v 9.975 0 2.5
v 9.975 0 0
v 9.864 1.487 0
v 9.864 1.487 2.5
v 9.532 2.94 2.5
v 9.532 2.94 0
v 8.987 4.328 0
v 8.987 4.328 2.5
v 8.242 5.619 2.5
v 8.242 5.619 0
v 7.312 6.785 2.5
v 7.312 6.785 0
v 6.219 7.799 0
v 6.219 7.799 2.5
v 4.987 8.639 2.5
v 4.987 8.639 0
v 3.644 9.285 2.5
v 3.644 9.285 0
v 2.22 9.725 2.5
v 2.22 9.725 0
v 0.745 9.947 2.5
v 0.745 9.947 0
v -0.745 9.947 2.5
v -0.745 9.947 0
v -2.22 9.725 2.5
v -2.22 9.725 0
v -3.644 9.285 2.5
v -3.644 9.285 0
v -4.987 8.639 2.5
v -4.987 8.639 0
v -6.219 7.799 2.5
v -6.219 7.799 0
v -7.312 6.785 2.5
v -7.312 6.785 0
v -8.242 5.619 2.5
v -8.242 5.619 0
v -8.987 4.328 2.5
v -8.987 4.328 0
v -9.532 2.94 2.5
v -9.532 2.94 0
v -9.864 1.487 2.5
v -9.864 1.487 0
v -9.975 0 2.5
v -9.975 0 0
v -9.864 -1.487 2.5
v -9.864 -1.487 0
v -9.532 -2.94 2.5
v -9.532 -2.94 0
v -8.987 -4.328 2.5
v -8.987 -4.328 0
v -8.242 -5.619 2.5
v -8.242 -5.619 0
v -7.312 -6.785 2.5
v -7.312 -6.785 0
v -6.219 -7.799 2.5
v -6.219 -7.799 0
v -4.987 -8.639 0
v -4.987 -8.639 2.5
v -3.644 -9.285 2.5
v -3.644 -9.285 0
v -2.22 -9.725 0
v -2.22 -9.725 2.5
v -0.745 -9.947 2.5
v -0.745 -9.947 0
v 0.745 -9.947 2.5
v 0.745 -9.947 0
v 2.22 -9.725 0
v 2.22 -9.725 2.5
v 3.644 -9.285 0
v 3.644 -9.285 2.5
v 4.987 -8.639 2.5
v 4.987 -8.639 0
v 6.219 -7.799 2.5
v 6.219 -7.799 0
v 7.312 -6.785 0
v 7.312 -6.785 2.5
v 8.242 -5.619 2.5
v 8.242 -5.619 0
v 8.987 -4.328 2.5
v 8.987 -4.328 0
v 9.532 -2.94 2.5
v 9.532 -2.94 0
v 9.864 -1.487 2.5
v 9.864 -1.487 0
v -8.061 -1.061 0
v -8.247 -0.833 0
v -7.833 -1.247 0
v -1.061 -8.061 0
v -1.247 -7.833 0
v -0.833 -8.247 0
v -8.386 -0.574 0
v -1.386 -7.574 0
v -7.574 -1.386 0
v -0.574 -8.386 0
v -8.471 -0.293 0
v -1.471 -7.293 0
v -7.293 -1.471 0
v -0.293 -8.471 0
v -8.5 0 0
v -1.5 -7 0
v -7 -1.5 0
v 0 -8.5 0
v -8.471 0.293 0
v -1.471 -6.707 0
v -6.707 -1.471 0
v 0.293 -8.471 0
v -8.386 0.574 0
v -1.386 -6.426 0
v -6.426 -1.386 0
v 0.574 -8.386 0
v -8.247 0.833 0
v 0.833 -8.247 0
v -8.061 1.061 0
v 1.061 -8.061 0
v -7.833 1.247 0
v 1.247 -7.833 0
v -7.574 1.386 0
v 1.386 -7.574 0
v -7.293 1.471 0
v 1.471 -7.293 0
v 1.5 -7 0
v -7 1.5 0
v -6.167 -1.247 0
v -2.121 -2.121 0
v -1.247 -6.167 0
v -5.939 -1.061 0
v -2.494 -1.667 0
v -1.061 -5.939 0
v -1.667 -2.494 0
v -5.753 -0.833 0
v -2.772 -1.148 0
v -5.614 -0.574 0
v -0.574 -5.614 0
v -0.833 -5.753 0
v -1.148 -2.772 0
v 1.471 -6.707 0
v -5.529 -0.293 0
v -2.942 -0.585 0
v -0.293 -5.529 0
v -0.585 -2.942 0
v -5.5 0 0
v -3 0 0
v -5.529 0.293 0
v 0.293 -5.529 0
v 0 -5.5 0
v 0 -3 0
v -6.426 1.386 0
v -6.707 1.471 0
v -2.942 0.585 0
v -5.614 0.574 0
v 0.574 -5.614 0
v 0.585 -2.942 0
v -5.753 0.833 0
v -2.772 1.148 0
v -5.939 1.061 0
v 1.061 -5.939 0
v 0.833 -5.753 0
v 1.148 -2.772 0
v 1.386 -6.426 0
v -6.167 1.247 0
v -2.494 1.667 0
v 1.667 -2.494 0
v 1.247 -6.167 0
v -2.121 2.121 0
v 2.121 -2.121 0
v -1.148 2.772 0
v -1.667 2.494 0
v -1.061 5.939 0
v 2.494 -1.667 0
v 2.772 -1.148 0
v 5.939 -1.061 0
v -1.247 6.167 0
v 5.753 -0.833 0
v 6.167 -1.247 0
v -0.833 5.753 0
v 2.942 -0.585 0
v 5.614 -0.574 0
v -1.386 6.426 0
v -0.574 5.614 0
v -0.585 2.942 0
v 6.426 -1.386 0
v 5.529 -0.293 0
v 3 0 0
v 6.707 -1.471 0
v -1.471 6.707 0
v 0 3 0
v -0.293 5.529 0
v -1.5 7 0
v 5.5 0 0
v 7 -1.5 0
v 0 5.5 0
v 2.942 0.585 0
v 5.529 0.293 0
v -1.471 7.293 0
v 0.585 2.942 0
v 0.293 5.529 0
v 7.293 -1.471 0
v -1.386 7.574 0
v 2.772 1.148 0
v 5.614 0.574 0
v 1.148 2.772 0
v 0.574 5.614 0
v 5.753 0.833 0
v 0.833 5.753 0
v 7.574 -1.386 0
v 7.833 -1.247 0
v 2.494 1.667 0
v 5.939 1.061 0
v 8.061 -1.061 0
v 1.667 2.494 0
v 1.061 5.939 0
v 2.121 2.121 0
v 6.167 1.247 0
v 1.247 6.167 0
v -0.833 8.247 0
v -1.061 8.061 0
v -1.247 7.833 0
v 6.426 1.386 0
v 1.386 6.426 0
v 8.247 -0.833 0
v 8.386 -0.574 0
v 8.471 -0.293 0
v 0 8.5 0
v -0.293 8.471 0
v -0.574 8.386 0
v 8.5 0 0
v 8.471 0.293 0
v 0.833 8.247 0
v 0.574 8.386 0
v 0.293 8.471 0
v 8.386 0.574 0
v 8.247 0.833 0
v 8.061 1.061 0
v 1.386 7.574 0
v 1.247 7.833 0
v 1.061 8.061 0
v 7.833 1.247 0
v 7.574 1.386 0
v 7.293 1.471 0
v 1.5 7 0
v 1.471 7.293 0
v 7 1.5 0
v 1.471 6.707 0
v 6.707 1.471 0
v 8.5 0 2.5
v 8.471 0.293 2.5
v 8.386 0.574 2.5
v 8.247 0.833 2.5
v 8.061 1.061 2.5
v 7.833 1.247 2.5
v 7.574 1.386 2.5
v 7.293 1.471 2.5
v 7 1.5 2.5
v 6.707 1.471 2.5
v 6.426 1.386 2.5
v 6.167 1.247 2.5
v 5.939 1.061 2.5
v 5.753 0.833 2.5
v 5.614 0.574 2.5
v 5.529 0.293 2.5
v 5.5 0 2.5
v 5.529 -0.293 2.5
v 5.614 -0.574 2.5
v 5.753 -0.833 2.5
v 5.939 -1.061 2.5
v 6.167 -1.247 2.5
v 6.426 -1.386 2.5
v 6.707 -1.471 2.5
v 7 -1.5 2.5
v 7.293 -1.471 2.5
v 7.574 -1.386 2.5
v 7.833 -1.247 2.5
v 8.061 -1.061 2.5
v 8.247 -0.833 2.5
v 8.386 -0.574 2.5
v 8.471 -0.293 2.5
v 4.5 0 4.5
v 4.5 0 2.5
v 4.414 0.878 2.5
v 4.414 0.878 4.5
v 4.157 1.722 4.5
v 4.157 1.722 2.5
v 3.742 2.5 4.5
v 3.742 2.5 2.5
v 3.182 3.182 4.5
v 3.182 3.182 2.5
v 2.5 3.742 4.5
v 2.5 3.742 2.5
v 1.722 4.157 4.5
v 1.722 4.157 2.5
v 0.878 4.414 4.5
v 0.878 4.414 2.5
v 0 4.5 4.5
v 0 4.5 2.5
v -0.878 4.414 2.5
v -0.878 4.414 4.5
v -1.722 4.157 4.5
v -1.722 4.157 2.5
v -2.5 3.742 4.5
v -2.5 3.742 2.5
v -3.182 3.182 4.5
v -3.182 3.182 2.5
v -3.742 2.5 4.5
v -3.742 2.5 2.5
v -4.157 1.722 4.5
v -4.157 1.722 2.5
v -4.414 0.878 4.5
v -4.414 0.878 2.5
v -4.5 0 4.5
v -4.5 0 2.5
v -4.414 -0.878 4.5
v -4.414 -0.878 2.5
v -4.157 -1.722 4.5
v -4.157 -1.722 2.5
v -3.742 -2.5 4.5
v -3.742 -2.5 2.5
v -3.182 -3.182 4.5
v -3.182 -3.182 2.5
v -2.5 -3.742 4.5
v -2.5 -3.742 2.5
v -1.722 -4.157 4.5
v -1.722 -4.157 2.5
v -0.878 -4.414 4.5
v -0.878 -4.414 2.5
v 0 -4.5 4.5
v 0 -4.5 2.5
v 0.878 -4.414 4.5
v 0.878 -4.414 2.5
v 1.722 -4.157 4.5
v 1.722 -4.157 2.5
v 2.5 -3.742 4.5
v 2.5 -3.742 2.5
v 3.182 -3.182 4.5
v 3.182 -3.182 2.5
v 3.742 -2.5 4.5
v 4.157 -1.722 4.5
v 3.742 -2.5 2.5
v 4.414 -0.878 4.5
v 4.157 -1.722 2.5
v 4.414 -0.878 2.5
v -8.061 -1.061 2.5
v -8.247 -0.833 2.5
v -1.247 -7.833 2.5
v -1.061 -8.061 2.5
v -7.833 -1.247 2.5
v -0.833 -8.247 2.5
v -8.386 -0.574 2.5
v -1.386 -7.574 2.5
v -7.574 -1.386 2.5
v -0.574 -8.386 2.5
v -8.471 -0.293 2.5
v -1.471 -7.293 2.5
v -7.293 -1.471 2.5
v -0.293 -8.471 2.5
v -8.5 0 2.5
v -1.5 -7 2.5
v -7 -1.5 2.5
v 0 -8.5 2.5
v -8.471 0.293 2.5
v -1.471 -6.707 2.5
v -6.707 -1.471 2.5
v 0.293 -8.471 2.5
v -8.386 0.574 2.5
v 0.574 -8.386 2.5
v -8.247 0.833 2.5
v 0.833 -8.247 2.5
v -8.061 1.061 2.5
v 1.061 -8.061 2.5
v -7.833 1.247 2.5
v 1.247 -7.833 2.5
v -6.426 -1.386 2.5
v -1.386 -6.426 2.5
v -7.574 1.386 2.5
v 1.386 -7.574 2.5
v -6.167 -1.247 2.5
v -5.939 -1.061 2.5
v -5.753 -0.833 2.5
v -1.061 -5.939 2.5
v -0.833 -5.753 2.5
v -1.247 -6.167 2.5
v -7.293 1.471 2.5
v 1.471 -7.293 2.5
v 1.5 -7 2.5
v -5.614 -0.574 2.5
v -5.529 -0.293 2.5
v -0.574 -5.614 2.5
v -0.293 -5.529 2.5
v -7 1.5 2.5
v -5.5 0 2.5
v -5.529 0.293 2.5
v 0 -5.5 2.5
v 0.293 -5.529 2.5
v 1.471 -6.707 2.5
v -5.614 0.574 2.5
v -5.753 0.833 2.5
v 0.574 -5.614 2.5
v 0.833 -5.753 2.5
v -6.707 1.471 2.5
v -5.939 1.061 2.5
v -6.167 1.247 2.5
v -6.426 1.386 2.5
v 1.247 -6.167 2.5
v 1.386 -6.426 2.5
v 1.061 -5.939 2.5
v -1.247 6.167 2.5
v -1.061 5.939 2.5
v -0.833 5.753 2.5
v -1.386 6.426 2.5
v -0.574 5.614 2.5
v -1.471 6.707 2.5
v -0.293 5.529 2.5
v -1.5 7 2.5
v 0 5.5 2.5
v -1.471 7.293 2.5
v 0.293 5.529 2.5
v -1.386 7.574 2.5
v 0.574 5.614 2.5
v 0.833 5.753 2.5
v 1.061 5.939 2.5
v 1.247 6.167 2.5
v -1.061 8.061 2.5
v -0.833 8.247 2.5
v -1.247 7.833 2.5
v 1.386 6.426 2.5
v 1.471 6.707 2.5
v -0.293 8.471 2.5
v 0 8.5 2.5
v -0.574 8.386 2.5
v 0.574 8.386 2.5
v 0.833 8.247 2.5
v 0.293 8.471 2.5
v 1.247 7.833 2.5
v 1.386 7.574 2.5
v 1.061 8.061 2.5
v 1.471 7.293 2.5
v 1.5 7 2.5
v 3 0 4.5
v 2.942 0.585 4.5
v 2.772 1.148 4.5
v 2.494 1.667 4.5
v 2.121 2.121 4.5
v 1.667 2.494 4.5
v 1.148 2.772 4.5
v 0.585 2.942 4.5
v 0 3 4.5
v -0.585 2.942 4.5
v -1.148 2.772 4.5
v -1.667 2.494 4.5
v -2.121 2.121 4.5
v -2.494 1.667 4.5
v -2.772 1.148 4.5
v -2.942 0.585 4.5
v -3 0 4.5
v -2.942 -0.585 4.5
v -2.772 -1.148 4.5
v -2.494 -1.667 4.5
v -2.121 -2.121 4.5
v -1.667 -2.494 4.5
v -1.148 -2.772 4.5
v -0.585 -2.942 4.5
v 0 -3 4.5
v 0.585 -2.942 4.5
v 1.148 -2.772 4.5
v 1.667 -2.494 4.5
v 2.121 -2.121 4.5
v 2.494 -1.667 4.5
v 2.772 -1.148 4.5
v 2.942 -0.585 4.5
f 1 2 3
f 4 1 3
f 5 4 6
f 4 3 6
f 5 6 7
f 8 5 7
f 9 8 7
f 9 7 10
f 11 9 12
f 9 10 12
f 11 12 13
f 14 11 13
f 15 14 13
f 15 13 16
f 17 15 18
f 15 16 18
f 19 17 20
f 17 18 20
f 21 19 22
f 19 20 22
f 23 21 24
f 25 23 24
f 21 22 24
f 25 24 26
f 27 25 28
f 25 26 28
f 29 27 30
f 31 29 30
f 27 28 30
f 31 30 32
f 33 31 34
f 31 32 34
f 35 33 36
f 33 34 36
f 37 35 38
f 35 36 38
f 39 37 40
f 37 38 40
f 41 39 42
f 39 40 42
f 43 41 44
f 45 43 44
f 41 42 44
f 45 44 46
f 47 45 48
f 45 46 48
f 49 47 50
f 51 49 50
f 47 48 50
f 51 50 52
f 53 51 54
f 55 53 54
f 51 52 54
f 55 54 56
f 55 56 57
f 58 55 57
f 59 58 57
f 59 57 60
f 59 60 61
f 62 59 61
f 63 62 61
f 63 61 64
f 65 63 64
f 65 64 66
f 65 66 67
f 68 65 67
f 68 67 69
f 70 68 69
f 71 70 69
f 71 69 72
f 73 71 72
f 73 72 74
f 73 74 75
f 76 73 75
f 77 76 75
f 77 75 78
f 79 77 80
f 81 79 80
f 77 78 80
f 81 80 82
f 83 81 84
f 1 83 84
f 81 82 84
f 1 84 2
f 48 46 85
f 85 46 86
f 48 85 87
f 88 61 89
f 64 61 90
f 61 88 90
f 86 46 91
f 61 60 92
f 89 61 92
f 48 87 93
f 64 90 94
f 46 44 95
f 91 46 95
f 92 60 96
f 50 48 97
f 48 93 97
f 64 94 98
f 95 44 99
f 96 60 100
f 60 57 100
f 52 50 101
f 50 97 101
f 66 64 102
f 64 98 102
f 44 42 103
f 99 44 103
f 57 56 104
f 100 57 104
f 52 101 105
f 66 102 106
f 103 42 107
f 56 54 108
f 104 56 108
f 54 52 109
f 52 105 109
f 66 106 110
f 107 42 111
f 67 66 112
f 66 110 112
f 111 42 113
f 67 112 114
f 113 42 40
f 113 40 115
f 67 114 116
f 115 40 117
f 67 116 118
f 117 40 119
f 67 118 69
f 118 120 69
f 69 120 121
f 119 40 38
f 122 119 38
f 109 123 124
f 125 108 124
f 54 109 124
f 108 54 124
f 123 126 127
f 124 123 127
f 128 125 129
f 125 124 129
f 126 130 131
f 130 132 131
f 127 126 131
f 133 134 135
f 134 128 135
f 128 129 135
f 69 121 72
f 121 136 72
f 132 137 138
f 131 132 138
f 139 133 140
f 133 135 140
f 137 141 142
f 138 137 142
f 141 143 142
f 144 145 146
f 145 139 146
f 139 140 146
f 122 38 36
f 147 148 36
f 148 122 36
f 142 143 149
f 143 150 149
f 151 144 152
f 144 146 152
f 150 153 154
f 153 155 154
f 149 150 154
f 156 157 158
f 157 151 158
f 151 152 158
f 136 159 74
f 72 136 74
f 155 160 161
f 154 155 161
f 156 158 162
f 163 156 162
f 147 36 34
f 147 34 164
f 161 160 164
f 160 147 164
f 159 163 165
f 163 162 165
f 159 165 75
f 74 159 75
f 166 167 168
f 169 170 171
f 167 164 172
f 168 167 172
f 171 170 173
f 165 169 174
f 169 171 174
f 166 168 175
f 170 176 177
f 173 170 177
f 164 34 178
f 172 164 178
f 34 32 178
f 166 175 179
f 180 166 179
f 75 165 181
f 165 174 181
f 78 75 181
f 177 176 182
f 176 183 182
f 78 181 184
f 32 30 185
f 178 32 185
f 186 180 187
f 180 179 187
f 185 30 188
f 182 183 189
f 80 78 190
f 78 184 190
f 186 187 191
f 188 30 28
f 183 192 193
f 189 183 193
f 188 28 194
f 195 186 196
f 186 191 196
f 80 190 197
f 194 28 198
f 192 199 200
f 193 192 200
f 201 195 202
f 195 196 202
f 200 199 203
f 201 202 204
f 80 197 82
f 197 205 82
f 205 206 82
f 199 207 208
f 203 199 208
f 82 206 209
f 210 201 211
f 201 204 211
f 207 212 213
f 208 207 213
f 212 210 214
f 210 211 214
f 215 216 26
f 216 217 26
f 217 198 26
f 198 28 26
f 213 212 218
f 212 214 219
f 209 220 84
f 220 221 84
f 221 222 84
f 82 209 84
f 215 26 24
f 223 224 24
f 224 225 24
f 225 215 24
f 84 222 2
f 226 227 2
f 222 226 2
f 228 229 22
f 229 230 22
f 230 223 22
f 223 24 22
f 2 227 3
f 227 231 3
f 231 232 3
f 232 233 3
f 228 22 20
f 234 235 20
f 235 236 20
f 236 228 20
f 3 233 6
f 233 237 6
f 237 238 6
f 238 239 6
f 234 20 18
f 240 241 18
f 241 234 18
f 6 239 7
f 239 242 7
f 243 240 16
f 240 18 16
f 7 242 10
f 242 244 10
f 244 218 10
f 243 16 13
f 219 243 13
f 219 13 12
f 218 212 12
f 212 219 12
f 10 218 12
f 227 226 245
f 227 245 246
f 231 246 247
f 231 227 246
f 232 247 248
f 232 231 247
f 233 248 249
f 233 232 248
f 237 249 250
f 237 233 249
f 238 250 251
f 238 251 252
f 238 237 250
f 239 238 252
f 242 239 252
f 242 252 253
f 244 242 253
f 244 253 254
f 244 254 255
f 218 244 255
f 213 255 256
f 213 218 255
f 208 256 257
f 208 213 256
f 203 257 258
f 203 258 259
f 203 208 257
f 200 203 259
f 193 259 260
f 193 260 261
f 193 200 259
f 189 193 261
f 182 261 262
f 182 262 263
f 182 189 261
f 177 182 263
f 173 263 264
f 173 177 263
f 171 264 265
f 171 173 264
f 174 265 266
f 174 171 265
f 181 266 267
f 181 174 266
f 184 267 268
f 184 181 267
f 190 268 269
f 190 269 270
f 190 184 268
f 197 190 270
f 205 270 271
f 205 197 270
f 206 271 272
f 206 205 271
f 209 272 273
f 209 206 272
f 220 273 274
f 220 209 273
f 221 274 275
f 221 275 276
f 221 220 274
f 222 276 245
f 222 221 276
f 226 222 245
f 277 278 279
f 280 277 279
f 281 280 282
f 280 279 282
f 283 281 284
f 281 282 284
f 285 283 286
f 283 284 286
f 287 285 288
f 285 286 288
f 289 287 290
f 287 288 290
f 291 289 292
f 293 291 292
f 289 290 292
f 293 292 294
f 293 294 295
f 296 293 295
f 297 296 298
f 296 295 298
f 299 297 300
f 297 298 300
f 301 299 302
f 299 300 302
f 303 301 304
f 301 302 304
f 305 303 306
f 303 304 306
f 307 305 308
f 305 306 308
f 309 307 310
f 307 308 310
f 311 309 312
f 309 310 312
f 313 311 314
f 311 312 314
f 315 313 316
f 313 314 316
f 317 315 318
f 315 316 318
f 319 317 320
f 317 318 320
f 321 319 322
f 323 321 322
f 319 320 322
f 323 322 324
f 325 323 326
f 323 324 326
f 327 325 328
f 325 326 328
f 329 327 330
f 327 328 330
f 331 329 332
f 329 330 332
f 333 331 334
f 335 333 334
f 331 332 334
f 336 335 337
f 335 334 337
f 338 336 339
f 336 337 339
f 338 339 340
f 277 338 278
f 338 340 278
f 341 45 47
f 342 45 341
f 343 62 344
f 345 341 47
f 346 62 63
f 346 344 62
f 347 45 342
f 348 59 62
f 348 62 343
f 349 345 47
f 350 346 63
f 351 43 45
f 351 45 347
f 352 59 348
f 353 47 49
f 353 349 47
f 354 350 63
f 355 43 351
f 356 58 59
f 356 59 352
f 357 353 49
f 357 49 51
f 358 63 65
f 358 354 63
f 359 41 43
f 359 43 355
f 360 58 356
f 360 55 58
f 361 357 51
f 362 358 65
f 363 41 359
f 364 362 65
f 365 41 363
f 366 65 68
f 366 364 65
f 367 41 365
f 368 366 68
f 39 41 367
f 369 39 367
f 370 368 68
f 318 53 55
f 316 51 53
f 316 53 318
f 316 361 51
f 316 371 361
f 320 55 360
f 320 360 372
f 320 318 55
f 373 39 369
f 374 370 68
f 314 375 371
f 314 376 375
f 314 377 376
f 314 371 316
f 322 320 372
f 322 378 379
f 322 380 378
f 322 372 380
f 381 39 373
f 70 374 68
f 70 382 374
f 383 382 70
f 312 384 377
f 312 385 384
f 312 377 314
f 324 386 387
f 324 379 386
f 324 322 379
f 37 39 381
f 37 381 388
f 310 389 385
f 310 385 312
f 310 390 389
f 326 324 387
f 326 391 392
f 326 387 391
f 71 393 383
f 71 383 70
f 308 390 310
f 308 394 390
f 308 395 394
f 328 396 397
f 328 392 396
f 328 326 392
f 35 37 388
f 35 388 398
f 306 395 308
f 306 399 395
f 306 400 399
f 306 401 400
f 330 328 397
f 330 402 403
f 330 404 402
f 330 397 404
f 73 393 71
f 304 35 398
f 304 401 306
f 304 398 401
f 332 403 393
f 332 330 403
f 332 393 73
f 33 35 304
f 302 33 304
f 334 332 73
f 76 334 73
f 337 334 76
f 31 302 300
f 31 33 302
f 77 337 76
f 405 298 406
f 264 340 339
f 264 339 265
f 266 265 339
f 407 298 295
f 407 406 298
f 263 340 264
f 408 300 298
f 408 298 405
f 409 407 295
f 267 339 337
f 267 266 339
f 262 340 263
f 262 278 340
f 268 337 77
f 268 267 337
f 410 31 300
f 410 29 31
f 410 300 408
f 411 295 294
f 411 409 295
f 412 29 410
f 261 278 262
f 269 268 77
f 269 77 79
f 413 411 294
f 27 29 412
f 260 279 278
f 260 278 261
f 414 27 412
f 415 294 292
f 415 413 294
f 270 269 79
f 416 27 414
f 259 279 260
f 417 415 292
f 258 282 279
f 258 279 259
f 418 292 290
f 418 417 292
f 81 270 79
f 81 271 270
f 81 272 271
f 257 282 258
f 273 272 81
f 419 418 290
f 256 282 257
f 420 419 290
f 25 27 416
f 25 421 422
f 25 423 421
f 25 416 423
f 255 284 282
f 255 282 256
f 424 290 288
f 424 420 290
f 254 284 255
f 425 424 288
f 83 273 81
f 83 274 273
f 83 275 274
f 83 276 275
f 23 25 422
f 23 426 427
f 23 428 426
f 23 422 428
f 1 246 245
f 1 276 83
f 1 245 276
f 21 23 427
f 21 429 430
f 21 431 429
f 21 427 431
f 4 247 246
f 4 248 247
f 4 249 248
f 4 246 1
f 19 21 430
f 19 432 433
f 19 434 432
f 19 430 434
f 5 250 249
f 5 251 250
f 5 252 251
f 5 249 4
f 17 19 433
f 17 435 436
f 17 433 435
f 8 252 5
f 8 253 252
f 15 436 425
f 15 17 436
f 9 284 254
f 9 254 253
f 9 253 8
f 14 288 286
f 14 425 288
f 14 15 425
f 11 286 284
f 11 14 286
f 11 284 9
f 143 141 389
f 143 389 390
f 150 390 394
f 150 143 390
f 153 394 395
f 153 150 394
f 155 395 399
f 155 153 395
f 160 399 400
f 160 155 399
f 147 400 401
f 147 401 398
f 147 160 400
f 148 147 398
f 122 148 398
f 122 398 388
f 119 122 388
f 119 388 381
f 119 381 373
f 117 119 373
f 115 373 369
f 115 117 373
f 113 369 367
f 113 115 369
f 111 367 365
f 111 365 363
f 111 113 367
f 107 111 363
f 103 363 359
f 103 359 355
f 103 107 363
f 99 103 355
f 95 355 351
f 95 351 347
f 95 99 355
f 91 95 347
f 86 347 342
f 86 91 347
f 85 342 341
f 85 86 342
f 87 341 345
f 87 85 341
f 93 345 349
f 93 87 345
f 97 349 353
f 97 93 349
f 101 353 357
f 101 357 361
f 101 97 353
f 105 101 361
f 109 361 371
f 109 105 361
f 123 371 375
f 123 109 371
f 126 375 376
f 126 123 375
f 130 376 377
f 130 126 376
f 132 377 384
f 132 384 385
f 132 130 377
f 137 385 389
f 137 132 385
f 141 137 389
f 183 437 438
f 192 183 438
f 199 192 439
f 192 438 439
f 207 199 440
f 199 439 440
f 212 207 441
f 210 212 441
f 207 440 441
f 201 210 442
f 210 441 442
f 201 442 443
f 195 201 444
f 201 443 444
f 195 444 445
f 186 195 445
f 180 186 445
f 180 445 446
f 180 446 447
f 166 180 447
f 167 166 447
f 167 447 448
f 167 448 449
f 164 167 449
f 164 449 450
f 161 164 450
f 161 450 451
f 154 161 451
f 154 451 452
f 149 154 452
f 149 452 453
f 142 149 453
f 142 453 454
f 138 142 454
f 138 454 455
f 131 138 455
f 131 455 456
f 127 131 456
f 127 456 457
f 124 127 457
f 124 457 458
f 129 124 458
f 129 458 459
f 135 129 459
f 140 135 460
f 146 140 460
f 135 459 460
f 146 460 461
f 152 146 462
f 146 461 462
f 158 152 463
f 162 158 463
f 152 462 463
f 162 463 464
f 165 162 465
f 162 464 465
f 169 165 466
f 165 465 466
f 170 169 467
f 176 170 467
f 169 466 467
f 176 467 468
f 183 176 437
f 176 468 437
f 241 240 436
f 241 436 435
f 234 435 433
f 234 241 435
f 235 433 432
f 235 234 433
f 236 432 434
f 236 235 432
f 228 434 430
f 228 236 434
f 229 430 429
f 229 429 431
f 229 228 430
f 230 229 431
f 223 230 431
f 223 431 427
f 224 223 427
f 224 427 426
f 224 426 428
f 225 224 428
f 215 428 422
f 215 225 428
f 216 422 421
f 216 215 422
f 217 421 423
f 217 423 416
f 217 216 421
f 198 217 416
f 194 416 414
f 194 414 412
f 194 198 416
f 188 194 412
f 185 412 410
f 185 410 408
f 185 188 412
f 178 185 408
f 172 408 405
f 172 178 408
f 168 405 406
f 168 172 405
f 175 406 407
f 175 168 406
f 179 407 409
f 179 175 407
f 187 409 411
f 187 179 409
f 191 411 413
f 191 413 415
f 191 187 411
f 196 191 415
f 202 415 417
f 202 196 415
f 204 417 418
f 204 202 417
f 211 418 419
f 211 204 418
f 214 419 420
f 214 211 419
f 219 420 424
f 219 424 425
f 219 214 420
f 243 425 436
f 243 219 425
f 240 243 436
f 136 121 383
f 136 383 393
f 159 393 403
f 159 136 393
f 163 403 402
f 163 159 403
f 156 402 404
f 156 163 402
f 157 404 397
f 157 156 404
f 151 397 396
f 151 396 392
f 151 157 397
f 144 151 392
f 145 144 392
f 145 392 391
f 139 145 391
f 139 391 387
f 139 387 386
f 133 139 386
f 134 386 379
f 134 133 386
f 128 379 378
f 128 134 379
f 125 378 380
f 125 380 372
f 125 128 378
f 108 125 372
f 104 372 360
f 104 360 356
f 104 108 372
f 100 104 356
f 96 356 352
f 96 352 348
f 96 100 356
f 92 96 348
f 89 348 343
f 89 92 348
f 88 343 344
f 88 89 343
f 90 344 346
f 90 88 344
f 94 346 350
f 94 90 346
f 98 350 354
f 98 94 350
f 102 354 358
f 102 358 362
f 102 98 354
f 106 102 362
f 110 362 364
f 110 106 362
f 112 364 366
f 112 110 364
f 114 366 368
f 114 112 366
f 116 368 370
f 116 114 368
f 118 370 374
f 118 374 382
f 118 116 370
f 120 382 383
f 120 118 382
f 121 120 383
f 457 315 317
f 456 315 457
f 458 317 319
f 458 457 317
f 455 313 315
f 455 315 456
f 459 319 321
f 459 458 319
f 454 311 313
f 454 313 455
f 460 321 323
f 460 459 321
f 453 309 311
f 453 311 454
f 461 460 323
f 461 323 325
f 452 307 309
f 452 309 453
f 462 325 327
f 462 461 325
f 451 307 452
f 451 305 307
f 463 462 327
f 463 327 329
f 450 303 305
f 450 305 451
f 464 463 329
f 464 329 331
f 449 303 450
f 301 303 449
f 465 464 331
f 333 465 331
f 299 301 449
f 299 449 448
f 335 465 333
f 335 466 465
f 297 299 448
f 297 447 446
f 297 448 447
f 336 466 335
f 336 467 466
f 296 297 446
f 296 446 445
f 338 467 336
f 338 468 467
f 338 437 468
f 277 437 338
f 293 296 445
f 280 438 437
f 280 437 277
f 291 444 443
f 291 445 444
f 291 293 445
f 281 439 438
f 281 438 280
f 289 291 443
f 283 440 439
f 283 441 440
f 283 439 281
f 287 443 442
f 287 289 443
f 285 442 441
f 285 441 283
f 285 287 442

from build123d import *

# Parameters (mm, degrees)
SKETCH1_R           = 9.975
SKETCH1_R_2         = 1.5
BOSS_EXTRUDE1_DEPTH = 2.5
SKETCH2_R           = 4.5
BOSS_EXTRUDE2_DEPTH = 2
SKETCH3_R           = 3
CUT_EXTRUDE1_DEPTH  = 15.807135104


with BuildPart() as part:
    # Sketch1 → Boss-Extrude1 (new body)
    with BuildSketch(Plane.XY):
        Circle(SKETCH1_R)
        with Locations((0, 7)):
            Circle(SKETCH1_R_2, mode=Mode.SUBTRACT)
        with Locations((7, 0)):
            Circle(SKETCH1_R_2, mode=Mode.SUBTRACT)
        with Locations((0, -7)):
            Circle(SKETCH1_R_2, mode=Mode.SUBTRACT)
        with Locations((-7, 0)):
            Circle(SKETCH1_R_2, mode=Mode.SUBTRACT)
    extrude(amount=BOSS_EXTRUDE1_DEPTH)

    # Sketch2 → Boss-Extrude2 (add)
    with BuildSketch(Plane.XY.offset(2.5)):
        Circle(SKETCH2_R)
    extrude(amount=BOSS_EXTRUDE2_DEPTH)

    # Sketch3 → Cut-Extrude1 (cut, through all)
    with BuildSketch(Plane.XY.offset(4.5)):
        Circle(SKETCH3_R)
    extrude(amount=-CUT_EXTRUDE1_DEPTH, mode=Mode.SUBTRACT)


solid = part.part
